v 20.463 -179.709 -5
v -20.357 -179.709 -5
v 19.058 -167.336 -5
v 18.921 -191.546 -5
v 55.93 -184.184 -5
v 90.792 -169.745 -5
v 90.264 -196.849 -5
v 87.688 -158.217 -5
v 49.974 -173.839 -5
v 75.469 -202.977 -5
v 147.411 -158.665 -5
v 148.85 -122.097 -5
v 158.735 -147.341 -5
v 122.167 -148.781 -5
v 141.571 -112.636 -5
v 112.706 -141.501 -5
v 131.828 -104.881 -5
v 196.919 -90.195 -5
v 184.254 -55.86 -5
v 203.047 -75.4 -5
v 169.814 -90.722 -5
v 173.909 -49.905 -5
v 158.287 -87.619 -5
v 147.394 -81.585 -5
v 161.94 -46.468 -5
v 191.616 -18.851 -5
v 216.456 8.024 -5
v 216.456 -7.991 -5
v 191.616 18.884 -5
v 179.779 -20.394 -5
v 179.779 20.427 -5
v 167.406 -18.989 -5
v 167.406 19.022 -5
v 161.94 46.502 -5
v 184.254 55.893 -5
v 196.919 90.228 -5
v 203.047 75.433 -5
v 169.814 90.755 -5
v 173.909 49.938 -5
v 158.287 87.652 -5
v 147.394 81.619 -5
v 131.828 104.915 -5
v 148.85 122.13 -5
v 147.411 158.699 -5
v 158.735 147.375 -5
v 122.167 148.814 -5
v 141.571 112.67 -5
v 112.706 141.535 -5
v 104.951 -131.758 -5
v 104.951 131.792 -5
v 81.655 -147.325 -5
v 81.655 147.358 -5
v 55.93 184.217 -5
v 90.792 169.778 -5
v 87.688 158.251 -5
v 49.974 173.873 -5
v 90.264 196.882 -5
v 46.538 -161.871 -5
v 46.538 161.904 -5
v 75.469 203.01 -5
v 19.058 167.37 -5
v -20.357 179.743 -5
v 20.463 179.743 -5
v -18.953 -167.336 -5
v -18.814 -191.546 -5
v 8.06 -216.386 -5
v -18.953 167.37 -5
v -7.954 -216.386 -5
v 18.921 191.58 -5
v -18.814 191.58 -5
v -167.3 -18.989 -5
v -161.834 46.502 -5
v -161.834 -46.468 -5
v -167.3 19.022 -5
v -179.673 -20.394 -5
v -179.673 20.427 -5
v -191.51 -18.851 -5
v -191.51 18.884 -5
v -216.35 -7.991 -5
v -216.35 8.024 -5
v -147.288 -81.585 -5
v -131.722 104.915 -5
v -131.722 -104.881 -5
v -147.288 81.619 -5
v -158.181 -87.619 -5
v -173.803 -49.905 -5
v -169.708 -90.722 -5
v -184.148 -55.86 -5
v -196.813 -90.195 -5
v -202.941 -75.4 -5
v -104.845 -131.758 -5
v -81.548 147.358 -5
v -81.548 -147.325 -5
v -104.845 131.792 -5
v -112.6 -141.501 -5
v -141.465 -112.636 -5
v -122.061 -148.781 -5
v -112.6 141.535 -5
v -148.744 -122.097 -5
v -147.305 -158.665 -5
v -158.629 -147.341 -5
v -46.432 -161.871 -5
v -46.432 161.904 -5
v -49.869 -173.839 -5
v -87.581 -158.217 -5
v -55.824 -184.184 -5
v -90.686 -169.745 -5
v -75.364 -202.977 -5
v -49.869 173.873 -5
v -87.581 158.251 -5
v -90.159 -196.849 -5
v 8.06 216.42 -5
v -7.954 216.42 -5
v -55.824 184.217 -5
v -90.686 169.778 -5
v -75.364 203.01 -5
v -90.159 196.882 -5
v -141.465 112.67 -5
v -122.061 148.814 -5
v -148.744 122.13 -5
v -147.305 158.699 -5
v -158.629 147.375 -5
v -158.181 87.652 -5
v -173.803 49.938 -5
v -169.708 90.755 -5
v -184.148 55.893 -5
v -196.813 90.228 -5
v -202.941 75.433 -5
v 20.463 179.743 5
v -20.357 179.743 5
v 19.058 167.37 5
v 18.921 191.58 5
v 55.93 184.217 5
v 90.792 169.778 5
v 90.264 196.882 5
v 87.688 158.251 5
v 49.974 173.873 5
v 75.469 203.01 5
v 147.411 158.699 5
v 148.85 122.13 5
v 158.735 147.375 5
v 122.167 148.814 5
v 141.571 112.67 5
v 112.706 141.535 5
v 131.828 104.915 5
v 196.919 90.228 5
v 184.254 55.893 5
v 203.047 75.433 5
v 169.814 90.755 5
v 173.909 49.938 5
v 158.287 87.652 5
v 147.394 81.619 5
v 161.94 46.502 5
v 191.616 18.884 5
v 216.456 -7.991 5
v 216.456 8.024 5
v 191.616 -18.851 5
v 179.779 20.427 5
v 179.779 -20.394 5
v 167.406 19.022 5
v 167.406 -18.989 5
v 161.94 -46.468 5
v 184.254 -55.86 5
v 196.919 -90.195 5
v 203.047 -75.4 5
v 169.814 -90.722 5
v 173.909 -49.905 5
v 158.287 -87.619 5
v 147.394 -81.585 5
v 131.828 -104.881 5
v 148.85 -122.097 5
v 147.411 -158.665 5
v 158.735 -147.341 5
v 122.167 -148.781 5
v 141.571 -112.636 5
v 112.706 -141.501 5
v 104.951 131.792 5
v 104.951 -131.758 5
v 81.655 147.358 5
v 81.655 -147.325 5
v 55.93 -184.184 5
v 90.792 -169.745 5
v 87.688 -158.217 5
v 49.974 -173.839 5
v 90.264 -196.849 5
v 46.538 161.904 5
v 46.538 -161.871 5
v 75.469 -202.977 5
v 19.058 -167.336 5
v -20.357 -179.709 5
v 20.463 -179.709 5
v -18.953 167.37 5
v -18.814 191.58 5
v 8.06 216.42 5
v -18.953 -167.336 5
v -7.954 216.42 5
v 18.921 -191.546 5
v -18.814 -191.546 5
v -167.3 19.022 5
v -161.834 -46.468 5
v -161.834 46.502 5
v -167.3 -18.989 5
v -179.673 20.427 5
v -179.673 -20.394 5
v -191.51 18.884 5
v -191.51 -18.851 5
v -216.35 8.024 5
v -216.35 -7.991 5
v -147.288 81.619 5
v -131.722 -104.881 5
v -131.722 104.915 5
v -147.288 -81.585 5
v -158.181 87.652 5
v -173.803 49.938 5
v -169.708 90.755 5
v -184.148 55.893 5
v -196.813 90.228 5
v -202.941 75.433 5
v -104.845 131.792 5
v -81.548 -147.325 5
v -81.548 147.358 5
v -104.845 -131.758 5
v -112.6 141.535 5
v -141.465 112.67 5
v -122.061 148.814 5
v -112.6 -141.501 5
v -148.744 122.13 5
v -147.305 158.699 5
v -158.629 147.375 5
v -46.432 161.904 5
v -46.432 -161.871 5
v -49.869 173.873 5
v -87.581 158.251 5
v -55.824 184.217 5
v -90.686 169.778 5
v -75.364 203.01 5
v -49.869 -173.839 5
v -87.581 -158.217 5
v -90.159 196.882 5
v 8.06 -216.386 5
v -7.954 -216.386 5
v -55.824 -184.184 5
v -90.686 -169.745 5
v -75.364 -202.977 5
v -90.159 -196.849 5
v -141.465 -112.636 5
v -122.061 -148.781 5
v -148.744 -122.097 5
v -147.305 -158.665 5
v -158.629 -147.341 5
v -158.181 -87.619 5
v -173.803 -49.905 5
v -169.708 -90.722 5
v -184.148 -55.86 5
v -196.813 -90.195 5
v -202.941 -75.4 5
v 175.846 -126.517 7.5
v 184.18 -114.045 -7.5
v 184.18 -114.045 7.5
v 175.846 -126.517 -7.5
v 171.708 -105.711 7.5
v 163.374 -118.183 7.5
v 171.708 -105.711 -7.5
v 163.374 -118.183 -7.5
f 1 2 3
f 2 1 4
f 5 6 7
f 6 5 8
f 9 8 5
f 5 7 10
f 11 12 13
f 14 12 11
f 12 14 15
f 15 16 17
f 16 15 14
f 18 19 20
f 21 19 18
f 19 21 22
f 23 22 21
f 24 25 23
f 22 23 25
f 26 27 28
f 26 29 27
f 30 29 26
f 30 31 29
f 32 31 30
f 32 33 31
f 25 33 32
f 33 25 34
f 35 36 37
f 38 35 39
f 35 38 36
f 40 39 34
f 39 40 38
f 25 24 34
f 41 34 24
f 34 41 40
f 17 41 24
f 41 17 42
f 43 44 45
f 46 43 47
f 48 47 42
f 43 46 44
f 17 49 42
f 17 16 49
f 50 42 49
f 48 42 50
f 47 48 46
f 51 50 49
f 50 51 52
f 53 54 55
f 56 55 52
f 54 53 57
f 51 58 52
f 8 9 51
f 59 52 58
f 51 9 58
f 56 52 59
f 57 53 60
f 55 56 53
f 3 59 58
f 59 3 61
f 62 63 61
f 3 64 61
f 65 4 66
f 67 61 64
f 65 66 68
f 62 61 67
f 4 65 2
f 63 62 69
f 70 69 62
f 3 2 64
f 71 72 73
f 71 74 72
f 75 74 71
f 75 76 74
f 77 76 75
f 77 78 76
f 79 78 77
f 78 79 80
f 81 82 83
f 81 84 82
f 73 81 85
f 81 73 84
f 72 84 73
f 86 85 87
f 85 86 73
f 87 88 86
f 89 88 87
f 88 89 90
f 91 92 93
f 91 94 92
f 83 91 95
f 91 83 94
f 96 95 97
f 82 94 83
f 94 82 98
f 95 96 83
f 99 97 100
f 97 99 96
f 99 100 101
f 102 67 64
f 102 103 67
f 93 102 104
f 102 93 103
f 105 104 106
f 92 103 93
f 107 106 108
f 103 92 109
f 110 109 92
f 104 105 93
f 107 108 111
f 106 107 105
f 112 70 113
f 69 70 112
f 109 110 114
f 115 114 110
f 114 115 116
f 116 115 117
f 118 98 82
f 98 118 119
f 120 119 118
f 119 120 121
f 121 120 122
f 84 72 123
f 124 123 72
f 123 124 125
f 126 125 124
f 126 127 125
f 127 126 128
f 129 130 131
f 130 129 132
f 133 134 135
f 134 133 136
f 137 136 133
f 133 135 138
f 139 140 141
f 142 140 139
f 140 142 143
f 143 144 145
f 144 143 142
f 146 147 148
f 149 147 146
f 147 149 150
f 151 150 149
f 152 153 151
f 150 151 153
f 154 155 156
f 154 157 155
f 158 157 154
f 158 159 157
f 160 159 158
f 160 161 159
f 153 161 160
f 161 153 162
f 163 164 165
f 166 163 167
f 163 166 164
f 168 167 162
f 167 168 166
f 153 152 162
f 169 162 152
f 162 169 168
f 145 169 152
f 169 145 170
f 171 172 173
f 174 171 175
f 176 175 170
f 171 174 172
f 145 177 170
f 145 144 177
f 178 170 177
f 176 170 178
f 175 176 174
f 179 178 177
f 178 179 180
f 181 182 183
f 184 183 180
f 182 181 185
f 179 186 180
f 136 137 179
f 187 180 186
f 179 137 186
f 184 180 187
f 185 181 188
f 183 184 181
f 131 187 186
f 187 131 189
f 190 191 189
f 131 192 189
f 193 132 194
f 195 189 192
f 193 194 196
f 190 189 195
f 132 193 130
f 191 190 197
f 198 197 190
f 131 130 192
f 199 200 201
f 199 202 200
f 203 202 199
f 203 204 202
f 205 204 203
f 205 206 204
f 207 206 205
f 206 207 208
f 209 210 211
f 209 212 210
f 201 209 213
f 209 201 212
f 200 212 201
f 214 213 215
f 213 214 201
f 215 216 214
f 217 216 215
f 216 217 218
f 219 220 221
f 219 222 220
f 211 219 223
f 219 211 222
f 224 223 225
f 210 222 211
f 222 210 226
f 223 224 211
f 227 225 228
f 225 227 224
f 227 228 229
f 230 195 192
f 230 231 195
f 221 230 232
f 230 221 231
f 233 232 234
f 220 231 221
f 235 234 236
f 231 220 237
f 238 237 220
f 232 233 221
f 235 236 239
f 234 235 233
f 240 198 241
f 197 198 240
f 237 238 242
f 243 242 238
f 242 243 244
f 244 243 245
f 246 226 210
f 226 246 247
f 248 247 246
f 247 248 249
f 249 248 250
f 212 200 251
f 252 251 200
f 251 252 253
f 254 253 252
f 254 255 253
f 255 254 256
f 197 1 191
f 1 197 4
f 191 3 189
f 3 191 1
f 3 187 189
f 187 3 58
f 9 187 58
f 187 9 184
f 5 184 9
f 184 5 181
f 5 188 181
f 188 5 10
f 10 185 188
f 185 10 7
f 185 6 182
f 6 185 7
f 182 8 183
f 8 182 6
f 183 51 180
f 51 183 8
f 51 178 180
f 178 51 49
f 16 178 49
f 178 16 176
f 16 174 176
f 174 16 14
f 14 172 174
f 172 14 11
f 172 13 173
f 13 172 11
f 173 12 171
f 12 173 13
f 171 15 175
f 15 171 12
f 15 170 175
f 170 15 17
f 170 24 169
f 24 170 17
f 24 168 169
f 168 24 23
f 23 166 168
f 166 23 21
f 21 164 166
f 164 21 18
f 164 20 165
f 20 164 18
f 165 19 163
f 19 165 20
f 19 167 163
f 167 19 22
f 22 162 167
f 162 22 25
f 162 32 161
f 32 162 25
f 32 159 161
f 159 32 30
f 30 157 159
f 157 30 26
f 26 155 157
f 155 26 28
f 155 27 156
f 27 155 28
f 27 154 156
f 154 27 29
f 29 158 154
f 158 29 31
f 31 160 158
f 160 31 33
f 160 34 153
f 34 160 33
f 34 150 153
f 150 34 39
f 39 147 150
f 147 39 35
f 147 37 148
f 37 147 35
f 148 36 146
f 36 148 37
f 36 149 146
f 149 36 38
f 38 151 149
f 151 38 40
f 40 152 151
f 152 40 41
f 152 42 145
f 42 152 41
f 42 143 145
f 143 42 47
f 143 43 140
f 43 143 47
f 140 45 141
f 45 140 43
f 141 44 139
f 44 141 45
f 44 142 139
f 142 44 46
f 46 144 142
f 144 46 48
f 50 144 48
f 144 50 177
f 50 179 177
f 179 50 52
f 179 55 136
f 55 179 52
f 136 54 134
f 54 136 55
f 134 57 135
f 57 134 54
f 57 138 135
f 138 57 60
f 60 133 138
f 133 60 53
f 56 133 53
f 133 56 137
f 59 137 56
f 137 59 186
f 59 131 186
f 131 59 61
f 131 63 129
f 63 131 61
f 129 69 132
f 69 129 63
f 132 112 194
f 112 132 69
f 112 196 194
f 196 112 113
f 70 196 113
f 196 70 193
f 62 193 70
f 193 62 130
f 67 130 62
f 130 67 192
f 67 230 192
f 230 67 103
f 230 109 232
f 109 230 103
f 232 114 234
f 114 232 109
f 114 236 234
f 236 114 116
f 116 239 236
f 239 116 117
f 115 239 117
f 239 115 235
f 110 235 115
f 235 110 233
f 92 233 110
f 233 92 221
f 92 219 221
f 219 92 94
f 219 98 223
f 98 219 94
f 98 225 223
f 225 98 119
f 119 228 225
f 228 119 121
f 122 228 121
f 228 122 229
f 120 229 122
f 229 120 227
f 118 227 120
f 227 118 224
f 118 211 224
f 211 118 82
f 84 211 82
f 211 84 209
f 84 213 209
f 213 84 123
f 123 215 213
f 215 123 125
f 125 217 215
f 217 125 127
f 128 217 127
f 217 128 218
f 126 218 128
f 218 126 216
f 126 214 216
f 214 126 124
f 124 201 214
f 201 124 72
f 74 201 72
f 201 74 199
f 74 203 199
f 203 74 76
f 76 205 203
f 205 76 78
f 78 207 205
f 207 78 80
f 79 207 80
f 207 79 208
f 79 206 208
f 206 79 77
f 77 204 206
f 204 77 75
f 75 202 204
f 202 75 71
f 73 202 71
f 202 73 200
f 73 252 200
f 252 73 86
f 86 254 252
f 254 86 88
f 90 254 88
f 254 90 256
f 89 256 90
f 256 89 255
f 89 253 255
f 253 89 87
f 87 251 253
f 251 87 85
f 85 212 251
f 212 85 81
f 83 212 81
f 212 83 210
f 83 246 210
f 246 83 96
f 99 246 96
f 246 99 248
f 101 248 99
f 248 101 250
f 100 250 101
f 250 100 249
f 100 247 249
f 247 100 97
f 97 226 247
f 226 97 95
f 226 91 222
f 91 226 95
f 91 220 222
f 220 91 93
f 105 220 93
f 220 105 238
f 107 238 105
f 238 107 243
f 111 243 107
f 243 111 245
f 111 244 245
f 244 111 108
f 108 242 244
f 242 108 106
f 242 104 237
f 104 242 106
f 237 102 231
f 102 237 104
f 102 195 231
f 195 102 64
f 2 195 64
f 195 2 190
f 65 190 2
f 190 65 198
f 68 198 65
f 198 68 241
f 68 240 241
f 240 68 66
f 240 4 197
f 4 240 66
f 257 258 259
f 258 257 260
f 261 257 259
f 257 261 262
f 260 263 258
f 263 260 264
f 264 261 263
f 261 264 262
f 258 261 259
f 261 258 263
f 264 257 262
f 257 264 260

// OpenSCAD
$fn=64;
translate ([-216.85,-905.6,0])
    linear_extrude(height = 10, center=true, convexity = 10)
        import (file = "gear.dxf");
rotate([0,0,-3*360/32])
    translate([209,0,0])
        cube(15, center=true);
